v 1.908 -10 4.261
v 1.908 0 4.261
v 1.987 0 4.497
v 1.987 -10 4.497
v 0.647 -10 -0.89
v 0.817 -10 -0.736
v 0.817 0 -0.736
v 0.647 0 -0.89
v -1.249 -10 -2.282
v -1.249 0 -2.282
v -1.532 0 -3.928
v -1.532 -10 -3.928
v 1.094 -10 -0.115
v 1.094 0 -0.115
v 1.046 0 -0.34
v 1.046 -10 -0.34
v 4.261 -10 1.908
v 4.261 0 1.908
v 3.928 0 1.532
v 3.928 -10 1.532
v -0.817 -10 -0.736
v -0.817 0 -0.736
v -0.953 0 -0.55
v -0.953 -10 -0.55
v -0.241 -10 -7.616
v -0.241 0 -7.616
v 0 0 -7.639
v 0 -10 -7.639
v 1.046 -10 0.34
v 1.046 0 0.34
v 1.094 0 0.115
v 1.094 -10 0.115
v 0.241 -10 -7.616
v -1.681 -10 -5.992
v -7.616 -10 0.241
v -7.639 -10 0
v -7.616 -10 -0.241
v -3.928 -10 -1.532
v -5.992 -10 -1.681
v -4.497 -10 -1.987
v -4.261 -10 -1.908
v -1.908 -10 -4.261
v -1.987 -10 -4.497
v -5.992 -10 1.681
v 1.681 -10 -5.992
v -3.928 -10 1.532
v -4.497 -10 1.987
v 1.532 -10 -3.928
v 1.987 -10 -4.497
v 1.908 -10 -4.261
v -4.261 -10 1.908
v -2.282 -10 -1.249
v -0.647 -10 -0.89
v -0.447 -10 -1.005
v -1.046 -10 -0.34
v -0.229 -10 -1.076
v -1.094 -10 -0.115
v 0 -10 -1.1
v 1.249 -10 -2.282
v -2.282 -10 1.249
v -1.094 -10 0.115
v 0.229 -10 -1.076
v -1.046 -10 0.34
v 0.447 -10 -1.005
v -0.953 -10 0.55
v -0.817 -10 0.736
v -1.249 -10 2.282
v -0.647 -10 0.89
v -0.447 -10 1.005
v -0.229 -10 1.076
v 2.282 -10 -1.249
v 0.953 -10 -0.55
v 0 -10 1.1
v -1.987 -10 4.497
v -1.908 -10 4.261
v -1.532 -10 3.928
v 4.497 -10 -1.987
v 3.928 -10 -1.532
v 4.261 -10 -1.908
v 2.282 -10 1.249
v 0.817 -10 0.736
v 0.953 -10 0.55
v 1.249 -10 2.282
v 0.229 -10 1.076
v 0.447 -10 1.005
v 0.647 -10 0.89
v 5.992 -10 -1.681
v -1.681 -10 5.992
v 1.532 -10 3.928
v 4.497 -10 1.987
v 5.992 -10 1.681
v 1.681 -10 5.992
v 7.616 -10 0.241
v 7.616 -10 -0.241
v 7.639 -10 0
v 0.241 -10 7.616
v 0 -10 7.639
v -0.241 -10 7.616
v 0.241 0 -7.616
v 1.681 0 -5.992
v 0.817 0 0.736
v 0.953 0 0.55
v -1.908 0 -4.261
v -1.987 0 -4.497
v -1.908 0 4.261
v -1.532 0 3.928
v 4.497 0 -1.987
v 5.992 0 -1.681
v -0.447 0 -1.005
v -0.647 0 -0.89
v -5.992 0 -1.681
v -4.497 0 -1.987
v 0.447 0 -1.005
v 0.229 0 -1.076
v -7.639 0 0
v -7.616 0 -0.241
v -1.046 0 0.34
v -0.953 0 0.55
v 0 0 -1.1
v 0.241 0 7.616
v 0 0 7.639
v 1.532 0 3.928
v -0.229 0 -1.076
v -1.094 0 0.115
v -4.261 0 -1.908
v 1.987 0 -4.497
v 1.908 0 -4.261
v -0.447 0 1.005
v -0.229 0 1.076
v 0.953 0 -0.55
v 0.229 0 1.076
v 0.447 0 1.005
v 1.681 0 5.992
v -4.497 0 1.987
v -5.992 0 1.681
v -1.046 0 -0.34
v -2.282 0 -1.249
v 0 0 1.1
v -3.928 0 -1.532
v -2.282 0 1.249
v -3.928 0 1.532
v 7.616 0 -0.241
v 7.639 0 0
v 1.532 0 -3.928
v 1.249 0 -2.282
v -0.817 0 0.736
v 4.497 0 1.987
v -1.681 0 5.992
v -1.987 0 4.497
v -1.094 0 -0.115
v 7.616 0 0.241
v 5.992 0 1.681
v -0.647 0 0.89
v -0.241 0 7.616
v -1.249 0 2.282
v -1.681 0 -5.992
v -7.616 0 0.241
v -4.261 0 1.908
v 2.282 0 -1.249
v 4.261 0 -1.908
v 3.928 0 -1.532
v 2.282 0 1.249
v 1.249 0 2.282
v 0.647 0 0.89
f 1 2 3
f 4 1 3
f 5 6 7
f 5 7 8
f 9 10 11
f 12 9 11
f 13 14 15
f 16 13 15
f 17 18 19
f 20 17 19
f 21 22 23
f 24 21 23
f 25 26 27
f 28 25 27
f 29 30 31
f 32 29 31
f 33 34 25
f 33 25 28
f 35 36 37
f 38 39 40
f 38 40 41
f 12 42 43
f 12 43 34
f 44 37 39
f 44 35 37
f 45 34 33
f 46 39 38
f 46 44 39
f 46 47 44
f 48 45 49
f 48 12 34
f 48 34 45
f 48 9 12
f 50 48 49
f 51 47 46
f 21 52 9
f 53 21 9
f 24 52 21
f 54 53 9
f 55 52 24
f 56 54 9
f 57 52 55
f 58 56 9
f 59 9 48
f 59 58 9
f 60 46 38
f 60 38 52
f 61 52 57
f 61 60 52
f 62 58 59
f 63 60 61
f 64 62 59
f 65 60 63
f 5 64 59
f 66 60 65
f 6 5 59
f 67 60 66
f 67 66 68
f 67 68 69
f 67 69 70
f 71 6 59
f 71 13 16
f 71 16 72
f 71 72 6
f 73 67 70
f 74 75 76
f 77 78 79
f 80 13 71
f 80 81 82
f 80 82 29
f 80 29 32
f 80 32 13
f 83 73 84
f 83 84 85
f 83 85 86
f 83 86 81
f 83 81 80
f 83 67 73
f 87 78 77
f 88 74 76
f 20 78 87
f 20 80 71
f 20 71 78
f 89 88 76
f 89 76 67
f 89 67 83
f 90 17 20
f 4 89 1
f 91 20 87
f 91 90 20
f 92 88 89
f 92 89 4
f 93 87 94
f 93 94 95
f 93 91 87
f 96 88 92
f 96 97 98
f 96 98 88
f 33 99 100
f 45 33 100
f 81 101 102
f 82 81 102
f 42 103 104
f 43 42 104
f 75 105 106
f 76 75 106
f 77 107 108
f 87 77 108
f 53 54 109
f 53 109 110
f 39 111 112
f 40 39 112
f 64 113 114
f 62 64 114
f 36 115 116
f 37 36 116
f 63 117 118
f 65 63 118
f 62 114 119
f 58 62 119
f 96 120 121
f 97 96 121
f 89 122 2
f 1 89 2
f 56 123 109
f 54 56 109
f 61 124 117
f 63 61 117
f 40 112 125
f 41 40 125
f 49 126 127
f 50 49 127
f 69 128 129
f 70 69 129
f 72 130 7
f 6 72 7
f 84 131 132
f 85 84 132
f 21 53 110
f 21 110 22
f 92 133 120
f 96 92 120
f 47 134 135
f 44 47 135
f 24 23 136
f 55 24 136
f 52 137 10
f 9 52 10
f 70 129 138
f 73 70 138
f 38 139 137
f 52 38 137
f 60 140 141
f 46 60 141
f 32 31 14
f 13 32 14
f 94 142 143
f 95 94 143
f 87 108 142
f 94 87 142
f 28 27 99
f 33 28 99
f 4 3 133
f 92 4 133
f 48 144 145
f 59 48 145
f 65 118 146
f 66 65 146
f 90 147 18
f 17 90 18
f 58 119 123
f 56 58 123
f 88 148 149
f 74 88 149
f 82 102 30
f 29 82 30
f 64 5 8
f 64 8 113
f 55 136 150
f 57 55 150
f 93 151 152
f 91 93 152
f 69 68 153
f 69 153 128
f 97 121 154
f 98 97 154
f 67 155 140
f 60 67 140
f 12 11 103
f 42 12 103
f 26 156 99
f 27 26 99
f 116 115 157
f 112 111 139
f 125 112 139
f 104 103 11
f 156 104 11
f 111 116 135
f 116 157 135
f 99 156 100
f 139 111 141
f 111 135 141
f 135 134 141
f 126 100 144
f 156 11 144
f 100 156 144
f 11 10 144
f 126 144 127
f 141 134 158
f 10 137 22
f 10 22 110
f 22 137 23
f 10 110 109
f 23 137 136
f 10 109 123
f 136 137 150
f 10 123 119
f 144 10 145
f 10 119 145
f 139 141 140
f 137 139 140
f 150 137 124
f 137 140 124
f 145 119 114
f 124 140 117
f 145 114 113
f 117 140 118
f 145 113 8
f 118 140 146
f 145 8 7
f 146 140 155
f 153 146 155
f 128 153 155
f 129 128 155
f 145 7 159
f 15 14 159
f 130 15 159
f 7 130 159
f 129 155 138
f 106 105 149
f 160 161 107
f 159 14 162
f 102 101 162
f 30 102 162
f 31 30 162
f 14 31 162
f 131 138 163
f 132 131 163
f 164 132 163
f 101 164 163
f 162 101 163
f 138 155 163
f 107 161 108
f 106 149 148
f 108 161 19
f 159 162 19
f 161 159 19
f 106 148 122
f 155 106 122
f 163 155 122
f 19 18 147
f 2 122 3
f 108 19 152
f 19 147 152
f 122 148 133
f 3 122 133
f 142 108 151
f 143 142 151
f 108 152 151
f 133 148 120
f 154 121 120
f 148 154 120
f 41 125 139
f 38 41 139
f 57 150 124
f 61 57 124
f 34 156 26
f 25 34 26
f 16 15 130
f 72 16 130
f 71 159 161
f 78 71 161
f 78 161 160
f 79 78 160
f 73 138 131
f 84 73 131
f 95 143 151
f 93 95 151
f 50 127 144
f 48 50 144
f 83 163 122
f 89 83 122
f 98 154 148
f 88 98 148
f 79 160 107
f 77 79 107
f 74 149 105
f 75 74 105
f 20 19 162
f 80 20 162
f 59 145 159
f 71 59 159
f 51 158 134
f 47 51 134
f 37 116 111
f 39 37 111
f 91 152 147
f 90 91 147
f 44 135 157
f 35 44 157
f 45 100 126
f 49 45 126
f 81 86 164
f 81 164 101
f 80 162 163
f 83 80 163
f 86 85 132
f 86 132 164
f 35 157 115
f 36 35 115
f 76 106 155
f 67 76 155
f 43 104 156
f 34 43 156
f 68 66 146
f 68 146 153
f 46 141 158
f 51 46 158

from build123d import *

# Parameters (mm, degrees)
F1_DEPTH = 10


with BuildPart() as f1:
    # F0 (on Front) → F1 (new body)
    with BuildSketch(Plane.XZ):
        Polygon((-1.680939, -5.992074), (-0.241203, -7.615681), (0, -7.639437), (0.241203, -7.615681), (1.680939, -5.992074), (1.986931, -4.496766), (1.908474, -4.261395), (1.532129, -3.927671), (1.248645, -2.281909), (2.281909, -1.248645), (3.927671, -1.532129), (4.261395, -1.908474), (4.496766, -1.986931), (5.992074, -1.680939), (7.615681, -0.241203), (7.639437, 0), (7.615681, 0.241203), (5.992074, 1.680939), (4.496766, 1.986931), (4.261395, 1.908474), (3.927671, 1.532129), (2.281909, 1.248645), (1.248645, 2.281909), (1.532129, 3.927671), (1.908474, 4.261395), (1.986931, 4.496766), (1.680939, 5.992074), (0.241203, 7.615681), (0, 7.639437), (-0.241203, 7.615681), (-1.680939, 5.992074), (-1.986931, 4.496766), (-1.908474, 4.261395), (-1.532129, 3.927671), (-1.248645, 2.281909), (-2.281909, 1.248645), (-3.927671, 1.532129), (-4.261395, 1.908474), (-4.496766, 1.986931), (-5.992074, 1.680939), (-7.615681, 0.241203), (-7.639437, 0), (-7.615681, -0.241203), (-5.992074, -1.680939), (-4.496766, -1.986931), (-4.261395, -1.908474), (-3.927671, -1.532129), (-2.281909, -1.248645), (-1.248645, -2.281909), (-1.532129, -3.927671), (-1.908474, -4.261395), (-1.986931, -4.496766), align=None)
        Polygon((0.44741, -1.0049), (0.228703, -1.075962), (0, -1.1), (-0.228703, -1.075962), (-0.44741, -1.0049), (-0.646564, -0.889919), (-0.817459, -0.736044), (-0.952628, -0.55), (-1.046162, -0.339919), (-1.093974, -0.114981), (-1.093974, 0.114981), (-1.046162, 0.339919), (-0.952628, 0.55), (-0.817459, 0.736044), (-0.646564, 0.889919), (-0.44741, 1.0049), (-0.228703, 1.075962), (0, 1.1), (0.228703, 1.075962), (0.44741, 1.0049), (0.646564, 0.889919), (0.817459, 0.736044), (0.952628, 0.55), (1.046162, 0.339919), (1.093974, 0.114981), (1.093974, -0.114981), (1.046162, -0.339919), (0.952628, -0.55), (0.817459, -0.736044), (0.646564, -0.889919), align=None, mode=Mode.SUBTRACT)
    extrude(amount=F1_DEPTH)


solid = f1.part
